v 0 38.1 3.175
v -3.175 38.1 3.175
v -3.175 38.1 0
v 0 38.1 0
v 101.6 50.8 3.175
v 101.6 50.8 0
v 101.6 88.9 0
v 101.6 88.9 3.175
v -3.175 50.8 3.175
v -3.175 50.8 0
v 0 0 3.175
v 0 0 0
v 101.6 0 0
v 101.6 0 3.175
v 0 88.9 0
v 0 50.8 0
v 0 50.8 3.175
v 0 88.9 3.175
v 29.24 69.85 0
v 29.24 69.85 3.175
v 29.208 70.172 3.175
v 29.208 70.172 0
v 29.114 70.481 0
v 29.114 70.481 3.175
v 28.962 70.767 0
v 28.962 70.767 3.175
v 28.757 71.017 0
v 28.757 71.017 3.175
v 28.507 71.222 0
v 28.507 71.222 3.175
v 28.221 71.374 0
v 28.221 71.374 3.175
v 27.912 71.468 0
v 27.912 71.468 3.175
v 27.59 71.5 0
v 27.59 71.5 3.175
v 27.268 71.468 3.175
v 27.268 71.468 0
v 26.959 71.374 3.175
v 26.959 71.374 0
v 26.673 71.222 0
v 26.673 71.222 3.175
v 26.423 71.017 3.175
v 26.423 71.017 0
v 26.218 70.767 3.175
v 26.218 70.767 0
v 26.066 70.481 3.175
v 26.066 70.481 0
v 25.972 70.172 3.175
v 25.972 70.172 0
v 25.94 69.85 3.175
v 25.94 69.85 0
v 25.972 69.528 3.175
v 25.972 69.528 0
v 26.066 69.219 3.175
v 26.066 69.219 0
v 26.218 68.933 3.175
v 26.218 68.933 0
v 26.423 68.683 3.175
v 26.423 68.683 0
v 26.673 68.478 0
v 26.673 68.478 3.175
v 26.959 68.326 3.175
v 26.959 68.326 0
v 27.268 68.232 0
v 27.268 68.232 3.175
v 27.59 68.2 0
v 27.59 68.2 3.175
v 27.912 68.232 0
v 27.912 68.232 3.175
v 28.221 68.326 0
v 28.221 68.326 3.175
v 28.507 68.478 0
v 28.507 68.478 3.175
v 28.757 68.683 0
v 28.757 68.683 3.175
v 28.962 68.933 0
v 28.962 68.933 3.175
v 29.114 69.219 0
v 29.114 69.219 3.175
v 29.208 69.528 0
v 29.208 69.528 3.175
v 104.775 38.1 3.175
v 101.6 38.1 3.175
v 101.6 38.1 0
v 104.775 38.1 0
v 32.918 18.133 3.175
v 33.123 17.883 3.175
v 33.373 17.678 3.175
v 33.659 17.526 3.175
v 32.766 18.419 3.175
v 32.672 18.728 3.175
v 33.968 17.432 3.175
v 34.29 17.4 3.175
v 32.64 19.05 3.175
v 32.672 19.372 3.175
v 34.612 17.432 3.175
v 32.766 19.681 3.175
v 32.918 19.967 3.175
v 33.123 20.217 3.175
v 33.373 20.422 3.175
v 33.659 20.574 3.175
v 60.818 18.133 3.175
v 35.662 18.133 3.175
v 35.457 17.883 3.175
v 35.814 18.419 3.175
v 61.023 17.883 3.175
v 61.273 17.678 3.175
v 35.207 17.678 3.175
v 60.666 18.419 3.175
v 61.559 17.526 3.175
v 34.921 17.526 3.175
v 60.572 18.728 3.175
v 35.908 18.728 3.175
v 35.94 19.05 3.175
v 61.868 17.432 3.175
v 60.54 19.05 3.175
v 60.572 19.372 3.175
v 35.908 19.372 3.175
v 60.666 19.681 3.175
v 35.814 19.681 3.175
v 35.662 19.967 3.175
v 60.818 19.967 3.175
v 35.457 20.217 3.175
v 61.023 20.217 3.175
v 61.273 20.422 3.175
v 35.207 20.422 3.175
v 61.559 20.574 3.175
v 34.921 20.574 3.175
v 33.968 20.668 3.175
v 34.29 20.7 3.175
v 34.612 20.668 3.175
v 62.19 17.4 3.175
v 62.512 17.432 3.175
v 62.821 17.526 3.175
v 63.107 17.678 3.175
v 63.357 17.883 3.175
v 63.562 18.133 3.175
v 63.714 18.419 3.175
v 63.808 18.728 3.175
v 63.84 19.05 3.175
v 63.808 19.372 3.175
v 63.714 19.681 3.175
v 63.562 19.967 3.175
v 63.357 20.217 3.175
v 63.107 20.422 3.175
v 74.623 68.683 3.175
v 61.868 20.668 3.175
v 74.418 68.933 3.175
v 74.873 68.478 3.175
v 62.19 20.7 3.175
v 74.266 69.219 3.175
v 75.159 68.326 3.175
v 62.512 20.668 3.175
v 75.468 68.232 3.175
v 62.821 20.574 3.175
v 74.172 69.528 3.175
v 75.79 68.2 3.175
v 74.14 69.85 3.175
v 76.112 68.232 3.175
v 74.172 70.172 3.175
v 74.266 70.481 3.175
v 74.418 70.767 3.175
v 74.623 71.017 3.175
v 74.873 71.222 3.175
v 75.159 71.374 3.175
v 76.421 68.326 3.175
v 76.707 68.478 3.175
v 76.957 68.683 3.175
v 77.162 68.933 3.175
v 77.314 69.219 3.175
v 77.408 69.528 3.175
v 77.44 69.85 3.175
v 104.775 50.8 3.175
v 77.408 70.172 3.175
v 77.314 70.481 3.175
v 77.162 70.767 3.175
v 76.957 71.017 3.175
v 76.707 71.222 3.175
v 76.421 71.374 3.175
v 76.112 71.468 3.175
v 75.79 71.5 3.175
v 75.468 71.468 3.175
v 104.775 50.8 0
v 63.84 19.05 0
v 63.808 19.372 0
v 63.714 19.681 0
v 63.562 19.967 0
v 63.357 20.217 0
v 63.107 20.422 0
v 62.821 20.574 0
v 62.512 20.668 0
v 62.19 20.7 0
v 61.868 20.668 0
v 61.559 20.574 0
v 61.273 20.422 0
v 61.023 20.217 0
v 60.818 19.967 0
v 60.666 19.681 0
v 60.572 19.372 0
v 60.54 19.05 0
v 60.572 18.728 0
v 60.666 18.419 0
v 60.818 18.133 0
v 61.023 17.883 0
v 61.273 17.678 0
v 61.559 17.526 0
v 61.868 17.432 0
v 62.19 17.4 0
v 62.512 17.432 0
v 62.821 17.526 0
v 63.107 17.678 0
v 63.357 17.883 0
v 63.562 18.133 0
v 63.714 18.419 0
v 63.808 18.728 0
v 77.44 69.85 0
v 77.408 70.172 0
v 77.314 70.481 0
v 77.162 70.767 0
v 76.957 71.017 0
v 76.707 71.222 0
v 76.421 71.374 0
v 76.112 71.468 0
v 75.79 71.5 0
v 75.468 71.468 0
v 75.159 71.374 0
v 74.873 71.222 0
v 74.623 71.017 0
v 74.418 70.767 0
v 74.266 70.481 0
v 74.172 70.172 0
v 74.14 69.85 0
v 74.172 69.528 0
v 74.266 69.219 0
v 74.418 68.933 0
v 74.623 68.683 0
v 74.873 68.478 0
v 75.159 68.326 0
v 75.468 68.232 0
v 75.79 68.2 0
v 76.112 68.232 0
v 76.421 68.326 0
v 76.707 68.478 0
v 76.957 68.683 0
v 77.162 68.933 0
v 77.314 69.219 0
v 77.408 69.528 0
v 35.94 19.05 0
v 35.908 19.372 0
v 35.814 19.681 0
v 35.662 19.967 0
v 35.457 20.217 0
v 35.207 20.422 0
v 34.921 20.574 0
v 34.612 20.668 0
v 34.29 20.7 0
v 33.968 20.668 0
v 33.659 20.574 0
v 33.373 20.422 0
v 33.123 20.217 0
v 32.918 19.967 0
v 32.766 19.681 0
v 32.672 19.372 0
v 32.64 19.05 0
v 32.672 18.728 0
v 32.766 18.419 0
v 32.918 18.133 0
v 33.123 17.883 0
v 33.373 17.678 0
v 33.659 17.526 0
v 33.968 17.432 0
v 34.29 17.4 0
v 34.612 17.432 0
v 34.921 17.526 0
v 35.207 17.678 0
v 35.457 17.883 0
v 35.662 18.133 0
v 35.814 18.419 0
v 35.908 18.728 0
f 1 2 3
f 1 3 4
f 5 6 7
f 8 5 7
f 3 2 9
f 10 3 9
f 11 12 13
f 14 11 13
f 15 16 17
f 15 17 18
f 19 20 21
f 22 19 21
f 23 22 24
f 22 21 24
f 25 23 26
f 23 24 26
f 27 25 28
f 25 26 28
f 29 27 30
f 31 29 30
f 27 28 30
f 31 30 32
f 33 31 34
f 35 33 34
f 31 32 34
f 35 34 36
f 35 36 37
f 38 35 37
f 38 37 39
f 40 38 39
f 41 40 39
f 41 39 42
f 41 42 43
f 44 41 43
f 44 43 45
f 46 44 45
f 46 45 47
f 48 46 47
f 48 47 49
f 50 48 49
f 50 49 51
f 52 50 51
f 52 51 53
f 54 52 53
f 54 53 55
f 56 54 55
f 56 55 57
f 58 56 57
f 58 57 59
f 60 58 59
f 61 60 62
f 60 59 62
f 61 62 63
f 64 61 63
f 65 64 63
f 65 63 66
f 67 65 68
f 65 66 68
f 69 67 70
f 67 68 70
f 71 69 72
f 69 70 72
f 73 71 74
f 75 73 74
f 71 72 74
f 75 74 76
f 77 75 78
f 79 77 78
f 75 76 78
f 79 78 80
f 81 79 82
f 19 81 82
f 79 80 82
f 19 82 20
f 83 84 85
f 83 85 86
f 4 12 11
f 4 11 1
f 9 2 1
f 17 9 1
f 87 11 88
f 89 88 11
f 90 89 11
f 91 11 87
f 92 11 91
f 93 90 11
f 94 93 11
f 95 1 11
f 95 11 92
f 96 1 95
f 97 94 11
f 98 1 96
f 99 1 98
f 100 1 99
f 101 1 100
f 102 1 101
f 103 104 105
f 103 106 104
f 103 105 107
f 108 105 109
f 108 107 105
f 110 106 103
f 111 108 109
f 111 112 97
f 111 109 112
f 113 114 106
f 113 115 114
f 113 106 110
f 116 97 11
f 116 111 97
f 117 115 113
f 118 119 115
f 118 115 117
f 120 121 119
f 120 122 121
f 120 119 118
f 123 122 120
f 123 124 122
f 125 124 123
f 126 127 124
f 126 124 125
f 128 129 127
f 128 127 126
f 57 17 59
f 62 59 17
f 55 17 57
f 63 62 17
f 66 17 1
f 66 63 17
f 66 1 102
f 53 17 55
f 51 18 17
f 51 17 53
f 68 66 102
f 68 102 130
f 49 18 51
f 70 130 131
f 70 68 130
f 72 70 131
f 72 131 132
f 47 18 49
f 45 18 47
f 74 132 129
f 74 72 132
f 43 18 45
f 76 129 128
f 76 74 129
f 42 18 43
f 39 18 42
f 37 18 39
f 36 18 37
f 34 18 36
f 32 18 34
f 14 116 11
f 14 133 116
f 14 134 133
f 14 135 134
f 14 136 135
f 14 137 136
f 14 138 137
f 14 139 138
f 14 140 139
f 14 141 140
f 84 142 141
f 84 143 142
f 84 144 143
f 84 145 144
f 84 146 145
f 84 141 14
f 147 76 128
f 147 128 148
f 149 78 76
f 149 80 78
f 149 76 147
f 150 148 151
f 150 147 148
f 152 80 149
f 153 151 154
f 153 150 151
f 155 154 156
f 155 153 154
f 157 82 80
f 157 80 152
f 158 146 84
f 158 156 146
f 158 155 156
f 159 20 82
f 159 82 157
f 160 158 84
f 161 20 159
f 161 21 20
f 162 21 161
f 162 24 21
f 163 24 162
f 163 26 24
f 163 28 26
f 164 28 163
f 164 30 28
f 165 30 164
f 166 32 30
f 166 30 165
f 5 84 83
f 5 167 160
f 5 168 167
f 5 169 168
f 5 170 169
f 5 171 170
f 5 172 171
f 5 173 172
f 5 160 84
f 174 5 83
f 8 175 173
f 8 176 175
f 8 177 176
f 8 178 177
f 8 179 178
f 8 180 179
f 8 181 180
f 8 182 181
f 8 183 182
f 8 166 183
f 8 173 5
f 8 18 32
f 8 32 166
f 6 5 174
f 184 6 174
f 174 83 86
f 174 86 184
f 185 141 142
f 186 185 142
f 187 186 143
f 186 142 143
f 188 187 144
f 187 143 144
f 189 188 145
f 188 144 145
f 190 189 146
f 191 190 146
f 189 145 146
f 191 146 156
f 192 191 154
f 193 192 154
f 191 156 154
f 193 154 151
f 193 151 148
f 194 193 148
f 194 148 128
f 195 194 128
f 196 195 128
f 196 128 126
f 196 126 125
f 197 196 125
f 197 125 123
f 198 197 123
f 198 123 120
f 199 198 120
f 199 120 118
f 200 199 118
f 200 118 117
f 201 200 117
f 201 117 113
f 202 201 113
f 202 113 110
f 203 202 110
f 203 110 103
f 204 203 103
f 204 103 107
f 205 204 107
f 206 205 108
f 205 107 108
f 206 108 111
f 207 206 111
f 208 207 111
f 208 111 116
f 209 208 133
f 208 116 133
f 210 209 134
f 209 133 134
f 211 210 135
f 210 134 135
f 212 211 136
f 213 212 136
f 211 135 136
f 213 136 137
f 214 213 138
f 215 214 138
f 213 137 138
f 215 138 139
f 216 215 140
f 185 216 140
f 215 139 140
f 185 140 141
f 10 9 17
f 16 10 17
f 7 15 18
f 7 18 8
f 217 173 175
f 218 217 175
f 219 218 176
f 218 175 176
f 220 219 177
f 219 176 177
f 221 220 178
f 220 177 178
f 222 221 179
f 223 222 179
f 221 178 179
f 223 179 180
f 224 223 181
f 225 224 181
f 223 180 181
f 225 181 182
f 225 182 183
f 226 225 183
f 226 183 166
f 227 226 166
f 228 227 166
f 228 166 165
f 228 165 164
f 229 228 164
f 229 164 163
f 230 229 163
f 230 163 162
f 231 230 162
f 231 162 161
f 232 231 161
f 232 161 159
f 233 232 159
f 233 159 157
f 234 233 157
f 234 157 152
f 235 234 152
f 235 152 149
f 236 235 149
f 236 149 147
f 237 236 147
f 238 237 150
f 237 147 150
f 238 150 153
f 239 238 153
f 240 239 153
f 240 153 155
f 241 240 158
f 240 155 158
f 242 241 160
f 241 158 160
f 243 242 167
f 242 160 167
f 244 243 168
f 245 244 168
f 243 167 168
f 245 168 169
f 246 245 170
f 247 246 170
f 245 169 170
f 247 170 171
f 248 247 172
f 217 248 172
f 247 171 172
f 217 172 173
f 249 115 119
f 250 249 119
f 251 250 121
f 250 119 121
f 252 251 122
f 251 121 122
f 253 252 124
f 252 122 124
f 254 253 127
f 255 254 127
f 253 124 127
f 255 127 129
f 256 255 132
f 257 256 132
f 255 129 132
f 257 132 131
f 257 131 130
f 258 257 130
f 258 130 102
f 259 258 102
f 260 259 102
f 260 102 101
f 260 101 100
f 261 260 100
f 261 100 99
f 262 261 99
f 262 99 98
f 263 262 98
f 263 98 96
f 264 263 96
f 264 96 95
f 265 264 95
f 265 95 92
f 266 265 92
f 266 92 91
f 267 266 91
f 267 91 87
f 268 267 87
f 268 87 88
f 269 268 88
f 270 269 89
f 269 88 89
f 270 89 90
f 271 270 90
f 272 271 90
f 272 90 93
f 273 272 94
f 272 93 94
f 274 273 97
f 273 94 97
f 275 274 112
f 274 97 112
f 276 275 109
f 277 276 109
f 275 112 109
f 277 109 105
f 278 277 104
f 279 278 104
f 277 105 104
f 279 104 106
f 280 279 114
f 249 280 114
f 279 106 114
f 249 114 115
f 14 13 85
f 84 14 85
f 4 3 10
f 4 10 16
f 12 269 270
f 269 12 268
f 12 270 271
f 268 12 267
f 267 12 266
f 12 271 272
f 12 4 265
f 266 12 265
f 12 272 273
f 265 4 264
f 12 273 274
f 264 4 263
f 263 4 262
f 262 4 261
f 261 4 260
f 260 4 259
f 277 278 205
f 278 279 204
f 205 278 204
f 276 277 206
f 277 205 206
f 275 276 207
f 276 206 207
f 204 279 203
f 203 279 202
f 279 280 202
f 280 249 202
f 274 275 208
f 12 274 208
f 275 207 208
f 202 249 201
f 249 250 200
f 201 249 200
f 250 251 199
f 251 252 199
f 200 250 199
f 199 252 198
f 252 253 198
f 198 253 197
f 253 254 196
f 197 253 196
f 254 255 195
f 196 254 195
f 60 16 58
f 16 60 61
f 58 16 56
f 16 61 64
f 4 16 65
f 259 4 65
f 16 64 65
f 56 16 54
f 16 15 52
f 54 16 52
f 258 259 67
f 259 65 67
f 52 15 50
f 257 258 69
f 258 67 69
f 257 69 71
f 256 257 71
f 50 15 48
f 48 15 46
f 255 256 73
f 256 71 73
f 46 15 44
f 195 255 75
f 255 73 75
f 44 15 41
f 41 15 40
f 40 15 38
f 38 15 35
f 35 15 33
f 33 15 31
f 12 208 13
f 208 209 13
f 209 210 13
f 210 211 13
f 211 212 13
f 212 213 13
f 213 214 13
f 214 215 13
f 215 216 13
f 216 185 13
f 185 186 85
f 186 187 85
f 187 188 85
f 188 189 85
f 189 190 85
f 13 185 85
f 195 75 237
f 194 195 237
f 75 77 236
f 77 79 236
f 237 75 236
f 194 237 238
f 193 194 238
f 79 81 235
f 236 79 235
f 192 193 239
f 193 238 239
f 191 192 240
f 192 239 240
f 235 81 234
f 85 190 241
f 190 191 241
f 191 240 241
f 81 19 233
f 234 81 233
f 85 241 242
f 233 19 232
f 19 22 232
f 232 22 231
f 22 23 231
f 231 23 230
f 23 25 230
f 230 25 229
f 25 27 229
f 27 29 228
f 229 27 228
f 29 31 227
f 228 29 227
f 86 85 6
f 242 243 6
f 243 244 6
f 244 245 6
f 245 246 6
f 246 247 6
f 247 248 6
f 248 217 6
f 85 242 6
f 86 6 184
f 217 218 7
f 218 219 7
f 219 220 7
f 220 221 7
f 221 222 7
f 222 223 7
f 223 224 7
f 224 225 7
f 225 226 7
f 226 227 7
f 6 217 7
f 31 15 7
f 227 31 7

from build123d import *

# Parameters (mm, degrees)
SKETCH1_W           = 101.6
SKETCH1_H           = 88.9
BOSS_EXTRUDE1_DEPTH = 3.175
SKETCH2_W           = 3.175
SKETCH2_H           = 12.7
BOSS_EXTRUDE2_DEPTH = 3.175
SKETCH3_R           = 1.65
CUT_EXTRUDE1_DEPTH  = 4.175


with BuildPart() as part:
    # Sketch1 → Boss-Extrude1 (new body)
    with BuildSketch(Plane.XY):
        with Locations((50.8, 44.45)):
            Rectangle(SKETCH1_W, SKETCH1_H)
    extrude(amount=BOSS_EXTRUDE1_DEPTH)

    # Sketch2 → Boss-Extrude2 (add)
    with BuildSketch(Plane.XY.offset(3.175)):
        with Locations((-1.5875, 44.45)):
            Rectangle(SKETCH2_W, SKETCH2_H)
        with Locations((103.1875, 44.45)):
            Rectangle(SKETCH2_W, SKETCH2_H)
    extrude(amount=-BOSS_EXTRUDE2_DEPTH)

    # Sketch3 → Cut-Extrude1 (cut, through all)
    with BuildSketch(Plane.XY.offset(3.175)):
        with Locations((27.589999938, 69.85)):
            Circle(SKETCH3_R)
        with Locations((75.790000058, 69.85)):
            Circle(SKETCH3_R)
        with Locations((62.19000008, 19.05)):
            Circle(SKETCH3_R)
        with Locations((34.29, 19.05)):
            Circle(SKETCH3_R)
    extrude(amount=-CUT_EXTRUDE1_DEPTH, mode=Mode.SUBTRACT)


solid = part.part
